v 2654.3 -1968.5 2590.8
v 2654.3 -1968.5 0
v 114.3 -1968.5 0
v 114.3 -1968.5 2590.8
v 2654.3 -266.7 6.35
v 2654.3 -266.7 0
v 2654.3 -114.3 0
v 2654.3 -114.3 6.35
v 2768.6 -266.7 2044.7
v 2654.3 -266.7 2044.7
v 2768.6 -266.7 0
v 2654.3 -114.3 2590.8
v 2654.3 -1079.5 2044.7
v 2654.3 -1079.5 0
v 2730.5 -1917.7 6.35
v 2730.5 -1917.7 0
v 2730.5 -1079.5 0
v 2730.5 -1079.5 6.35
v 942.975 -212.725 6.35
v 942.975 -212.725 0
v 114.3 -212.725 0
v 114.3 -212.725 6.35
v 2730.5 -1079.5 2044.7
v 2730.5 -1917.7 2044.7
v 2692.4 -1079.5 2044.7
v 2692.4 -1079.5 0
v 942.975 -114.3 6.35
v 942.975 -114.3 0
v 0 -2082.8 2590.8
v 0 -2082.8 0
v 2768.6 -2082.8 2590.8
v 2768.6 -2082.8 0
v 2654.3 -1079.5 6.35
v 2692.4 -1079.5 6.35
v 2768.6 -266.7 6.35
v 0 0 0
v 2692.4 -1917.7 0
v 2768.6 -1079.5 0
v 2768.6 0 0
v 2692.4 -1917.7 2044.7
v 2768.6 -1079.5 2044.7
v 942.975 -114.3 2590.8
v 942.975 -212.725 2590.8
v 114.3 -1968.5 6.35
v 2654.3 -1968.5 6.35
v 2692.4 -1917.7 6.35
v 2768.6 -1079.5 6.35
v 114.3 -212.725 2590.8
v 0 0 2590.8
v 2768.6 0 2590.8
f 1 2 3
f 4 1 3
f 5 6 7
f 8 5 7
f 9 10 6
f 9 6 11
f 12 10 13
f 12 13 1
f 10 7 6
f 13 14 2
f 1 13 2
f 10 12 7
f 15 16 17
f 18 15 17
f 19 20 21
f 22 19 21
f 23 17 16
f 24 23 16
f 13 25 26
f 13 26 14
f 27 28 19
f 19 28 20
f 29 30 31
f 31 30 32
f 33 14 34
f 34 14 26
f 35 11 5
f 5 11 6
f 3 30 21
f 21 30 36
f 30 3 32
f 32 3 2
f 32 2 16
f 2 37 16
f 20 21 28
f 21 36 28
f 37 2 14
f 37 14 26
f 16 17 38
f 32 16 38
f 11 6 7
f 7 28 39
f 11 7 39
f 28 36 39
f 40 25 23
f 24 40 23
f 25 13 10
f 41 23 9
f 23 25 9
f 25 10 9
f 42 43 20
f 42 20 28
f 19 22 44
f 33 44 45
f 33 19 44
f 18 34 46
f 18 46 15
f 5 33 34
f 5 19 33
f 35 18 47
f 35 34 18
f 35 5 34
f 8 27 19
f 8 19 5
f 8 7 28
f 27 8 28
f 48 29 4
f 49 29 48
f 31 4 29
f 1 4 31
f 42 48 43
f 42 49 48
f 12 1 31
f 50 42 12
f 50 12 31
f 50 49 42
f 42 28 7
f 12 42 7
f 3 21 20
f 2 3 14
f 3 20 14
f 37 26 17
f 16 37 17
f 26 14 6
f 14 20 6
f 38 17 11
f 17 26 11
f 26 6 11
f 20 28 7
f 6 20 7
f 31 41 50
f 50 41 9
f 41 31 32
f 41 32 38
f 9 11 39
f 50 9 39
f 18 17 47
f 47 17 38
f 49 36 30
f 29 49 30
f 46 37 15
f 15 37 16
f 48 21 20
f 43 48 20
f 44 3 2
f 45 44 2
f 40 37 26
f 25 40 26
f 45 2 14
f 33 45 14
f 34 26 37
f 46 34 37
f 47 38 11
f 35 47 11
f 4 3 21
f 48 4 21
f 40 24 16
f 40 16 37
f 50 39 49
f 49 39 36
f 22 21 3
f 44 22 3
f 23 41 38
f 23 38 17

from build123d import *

# Parameters (mm, degrees)
F1_DEPTH = 2590.8
F3_DEPTH = 6.35
F6_DEPTH = 546.1


with BuildPart() as f1:
    # F0 (on Top) → F1 (new body)
    with BuildSketch(Plane.XY):
        Polygon((2768.6, 0), (0, 0), (0, -2082.8), (2768.6, -2082.8), (2768.6, -1079.5), (2730.5, -1079.5), (2730.5, -1917.7), (2692.4, -1917.7), (2692.4, -1079.5), (2654.3, -1079.5), (2654.3, -1968.5), (114.3, -1968.5), (114.3, -212.725), (942.975, -212.725), (942.975, -114.3), (2654.3, -114.3), (2654.3, -266.7), (2768.6, -266.7), align=None)
    extrude(amount=F1_DEPTH)

    # F5 (on offset) → F6 (join)
    with BuildSketch(Plane.XY.offset(2044.7)):
        Polygon((2768.6, -266.7), (2654.3, -266.7), (2654.3, -1079.5), (2692.4, -1079.5), (2692.4, -1917.7), (2730.5, -1917.7), (2730.5, -1079.5), (2768.6, -1079.5), align=None)
    extrude(amount=F6_DEPTH)


with BuildPart() as f3:
    # F2 (on Top) → F3 (new body)
    with BuildSketch(Plane.XY):
        Polygon((942.975, -212.725), (114.3, -212.725), (114.3, -1968.5), (2654.3, -1968.5), (2654.3, -1079.5), (2692.4, -1079.5), (2692.4, -1917.7), (2730.5, -1917.7), (2730.5, -1079.5), (2768.6, -1079.5), (2768.6, -266.7), (2654.3, -266.7), (2654.3, -114.3), (942.975, -114.3), align=None)
    extrude(amount=F3_DEPTH)


solid = Compound([f1.part, f3.part])
